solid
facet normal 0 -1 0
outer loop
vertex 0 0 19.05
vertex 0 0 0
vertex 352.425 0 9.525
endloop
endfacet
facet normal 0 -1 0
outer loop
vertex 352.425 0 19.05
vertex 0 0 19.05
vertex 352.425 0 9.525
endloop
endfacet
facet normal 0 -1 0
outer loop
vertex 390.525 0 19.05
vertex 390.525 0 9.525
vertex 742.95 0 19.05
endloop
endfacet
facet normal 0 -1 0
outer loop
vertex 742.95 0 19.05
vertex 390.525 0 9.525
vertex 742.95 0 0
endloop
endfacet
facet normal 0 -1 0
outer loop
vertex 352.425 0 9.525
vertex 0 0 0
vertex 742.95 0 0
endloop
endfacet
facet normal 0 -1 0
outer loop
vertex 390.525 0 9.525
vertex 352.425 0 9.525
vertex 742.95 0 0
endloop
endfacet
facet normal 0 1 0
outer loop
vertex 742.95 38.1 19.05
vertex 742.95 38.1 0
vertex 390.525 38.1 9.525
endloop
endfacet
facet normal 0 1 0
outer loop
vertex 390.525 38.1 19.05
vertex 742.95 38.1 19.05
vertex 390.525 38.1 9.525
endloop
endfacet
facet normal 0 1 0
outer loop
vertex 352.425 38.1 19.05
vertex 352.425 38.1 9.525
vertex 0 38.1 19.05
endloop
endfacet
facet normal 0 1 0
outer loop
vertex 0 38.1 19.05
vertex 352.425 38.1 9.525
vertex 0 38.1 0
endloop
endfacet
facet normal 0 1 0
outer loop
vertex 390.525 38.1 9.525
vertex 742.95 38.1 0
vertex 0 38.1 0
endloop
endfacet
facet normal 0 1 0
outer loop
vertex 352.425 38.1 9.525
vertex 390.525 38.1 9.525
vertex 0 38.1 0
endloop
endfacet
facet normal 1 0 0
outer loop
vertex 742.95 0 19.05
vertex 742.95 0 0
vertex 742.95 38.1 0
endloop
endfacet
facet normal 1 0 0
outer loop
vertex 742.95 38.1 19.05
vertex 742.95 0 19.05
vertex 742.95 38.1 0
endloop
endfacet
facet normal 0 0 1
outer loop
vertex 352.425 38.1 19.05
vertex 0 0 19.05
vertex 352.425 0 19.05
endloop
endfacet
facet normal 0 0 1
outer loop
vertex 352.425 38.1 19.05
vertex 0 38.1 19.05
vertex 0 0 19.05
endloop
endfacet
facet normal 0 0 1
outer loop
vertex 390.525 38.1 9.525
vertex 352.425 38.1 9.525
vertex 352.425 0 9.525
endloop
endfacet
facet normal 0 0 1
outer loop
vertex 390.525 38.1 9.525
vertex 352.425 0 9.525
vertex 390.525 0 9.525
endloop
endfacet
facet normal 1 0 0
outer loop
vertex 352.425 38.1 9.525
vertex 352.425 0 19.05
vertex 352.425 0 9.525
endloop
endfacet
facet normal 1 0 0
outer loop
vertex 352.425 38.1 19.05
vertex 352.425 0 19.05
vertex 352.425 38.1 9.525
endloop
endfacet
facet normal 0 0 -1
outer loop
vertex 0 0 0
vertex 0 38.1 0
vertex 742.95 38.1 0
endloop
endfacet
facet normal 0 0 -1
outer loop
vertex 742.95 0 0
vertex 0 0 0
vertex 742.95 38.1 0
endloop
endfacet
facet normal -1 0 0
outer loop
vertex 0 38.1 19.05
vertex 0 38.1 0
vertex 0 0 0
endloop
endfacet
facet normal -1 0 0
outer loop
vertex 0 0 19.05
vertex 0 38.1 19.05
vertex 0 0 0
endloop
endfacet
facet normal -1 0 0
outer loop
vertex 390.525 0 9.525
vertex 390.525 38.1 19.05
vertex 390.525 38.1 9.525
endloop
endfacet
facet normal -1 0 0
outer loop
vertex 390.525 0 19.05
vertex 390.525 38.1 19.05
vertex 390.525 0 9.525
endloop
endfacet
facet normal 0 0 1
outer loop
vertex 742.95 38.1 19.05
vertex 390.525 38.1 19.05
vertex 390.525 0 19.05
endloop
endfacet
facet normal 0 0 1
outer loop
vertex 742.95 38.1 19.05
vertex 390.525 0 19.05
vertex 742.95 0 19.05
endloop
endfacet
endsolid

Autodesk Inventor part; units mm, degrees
ref_plane "YZ Plane" through (0, 0, 0) normal (1, 0, 0) x (0, 1, 0)
ref_plane "XZ Plane" through (0, 0, 0) normal (0, 1, 0) x (-1, 0, 0)
ref_plane "XY Plane" through (0, 0, 0) normal (0, 0, 1) x (1, 0, 0)
sketch "Sketch1" plane through (0, 0, 0) normal (0, 0, 1) x (1, 0, 0)
  line L0 (0, 0) -> (742.95, 0)
  line L1 (742.95, 0) -> (742.95, 38.1)
  line L2 (742.95, 38.1) -> (0, 38.1)
  line L3 (0, 38.1) -> (0, 0)
  dimension "d0" = 742.95
  dimension "d1" = 38.1
extrude "Board" add sketch "Sketch1" along normal blind 19.05
sketch "Sketch2" plane through (0, 0, 19.05) normal (0, 0, 1) x (1, 0, 0)
  line L0 (742.95, 38.1) -> (0, 38.1) projected
  line L1 (0, 0) -> (742.95, 0) projected
  line L2 (352.425, 38.1) -> (390.525, 38.1)
  line L3 (390.525, 38.1) -> (390.525, 0)
  line L4 (390.525, 0) -> (352.425, 0)
  line L5 (352.425, 0) -> (352.425, 38.1)
  line L6 (0, 38.1) -> (0, 0) projected
  dimension "d4" = 38.1
  dimension "d5" = 352.425
extrude "Extrusion2" cut sketch "Sketch2" against normal blind 9.525 contours L3 L1 L5 L0
equation "\"d5\" = -0.5 * d4 + 0.5 * d0"
properties part number "Cabinet Support Frame Horizontal Bar Low"
